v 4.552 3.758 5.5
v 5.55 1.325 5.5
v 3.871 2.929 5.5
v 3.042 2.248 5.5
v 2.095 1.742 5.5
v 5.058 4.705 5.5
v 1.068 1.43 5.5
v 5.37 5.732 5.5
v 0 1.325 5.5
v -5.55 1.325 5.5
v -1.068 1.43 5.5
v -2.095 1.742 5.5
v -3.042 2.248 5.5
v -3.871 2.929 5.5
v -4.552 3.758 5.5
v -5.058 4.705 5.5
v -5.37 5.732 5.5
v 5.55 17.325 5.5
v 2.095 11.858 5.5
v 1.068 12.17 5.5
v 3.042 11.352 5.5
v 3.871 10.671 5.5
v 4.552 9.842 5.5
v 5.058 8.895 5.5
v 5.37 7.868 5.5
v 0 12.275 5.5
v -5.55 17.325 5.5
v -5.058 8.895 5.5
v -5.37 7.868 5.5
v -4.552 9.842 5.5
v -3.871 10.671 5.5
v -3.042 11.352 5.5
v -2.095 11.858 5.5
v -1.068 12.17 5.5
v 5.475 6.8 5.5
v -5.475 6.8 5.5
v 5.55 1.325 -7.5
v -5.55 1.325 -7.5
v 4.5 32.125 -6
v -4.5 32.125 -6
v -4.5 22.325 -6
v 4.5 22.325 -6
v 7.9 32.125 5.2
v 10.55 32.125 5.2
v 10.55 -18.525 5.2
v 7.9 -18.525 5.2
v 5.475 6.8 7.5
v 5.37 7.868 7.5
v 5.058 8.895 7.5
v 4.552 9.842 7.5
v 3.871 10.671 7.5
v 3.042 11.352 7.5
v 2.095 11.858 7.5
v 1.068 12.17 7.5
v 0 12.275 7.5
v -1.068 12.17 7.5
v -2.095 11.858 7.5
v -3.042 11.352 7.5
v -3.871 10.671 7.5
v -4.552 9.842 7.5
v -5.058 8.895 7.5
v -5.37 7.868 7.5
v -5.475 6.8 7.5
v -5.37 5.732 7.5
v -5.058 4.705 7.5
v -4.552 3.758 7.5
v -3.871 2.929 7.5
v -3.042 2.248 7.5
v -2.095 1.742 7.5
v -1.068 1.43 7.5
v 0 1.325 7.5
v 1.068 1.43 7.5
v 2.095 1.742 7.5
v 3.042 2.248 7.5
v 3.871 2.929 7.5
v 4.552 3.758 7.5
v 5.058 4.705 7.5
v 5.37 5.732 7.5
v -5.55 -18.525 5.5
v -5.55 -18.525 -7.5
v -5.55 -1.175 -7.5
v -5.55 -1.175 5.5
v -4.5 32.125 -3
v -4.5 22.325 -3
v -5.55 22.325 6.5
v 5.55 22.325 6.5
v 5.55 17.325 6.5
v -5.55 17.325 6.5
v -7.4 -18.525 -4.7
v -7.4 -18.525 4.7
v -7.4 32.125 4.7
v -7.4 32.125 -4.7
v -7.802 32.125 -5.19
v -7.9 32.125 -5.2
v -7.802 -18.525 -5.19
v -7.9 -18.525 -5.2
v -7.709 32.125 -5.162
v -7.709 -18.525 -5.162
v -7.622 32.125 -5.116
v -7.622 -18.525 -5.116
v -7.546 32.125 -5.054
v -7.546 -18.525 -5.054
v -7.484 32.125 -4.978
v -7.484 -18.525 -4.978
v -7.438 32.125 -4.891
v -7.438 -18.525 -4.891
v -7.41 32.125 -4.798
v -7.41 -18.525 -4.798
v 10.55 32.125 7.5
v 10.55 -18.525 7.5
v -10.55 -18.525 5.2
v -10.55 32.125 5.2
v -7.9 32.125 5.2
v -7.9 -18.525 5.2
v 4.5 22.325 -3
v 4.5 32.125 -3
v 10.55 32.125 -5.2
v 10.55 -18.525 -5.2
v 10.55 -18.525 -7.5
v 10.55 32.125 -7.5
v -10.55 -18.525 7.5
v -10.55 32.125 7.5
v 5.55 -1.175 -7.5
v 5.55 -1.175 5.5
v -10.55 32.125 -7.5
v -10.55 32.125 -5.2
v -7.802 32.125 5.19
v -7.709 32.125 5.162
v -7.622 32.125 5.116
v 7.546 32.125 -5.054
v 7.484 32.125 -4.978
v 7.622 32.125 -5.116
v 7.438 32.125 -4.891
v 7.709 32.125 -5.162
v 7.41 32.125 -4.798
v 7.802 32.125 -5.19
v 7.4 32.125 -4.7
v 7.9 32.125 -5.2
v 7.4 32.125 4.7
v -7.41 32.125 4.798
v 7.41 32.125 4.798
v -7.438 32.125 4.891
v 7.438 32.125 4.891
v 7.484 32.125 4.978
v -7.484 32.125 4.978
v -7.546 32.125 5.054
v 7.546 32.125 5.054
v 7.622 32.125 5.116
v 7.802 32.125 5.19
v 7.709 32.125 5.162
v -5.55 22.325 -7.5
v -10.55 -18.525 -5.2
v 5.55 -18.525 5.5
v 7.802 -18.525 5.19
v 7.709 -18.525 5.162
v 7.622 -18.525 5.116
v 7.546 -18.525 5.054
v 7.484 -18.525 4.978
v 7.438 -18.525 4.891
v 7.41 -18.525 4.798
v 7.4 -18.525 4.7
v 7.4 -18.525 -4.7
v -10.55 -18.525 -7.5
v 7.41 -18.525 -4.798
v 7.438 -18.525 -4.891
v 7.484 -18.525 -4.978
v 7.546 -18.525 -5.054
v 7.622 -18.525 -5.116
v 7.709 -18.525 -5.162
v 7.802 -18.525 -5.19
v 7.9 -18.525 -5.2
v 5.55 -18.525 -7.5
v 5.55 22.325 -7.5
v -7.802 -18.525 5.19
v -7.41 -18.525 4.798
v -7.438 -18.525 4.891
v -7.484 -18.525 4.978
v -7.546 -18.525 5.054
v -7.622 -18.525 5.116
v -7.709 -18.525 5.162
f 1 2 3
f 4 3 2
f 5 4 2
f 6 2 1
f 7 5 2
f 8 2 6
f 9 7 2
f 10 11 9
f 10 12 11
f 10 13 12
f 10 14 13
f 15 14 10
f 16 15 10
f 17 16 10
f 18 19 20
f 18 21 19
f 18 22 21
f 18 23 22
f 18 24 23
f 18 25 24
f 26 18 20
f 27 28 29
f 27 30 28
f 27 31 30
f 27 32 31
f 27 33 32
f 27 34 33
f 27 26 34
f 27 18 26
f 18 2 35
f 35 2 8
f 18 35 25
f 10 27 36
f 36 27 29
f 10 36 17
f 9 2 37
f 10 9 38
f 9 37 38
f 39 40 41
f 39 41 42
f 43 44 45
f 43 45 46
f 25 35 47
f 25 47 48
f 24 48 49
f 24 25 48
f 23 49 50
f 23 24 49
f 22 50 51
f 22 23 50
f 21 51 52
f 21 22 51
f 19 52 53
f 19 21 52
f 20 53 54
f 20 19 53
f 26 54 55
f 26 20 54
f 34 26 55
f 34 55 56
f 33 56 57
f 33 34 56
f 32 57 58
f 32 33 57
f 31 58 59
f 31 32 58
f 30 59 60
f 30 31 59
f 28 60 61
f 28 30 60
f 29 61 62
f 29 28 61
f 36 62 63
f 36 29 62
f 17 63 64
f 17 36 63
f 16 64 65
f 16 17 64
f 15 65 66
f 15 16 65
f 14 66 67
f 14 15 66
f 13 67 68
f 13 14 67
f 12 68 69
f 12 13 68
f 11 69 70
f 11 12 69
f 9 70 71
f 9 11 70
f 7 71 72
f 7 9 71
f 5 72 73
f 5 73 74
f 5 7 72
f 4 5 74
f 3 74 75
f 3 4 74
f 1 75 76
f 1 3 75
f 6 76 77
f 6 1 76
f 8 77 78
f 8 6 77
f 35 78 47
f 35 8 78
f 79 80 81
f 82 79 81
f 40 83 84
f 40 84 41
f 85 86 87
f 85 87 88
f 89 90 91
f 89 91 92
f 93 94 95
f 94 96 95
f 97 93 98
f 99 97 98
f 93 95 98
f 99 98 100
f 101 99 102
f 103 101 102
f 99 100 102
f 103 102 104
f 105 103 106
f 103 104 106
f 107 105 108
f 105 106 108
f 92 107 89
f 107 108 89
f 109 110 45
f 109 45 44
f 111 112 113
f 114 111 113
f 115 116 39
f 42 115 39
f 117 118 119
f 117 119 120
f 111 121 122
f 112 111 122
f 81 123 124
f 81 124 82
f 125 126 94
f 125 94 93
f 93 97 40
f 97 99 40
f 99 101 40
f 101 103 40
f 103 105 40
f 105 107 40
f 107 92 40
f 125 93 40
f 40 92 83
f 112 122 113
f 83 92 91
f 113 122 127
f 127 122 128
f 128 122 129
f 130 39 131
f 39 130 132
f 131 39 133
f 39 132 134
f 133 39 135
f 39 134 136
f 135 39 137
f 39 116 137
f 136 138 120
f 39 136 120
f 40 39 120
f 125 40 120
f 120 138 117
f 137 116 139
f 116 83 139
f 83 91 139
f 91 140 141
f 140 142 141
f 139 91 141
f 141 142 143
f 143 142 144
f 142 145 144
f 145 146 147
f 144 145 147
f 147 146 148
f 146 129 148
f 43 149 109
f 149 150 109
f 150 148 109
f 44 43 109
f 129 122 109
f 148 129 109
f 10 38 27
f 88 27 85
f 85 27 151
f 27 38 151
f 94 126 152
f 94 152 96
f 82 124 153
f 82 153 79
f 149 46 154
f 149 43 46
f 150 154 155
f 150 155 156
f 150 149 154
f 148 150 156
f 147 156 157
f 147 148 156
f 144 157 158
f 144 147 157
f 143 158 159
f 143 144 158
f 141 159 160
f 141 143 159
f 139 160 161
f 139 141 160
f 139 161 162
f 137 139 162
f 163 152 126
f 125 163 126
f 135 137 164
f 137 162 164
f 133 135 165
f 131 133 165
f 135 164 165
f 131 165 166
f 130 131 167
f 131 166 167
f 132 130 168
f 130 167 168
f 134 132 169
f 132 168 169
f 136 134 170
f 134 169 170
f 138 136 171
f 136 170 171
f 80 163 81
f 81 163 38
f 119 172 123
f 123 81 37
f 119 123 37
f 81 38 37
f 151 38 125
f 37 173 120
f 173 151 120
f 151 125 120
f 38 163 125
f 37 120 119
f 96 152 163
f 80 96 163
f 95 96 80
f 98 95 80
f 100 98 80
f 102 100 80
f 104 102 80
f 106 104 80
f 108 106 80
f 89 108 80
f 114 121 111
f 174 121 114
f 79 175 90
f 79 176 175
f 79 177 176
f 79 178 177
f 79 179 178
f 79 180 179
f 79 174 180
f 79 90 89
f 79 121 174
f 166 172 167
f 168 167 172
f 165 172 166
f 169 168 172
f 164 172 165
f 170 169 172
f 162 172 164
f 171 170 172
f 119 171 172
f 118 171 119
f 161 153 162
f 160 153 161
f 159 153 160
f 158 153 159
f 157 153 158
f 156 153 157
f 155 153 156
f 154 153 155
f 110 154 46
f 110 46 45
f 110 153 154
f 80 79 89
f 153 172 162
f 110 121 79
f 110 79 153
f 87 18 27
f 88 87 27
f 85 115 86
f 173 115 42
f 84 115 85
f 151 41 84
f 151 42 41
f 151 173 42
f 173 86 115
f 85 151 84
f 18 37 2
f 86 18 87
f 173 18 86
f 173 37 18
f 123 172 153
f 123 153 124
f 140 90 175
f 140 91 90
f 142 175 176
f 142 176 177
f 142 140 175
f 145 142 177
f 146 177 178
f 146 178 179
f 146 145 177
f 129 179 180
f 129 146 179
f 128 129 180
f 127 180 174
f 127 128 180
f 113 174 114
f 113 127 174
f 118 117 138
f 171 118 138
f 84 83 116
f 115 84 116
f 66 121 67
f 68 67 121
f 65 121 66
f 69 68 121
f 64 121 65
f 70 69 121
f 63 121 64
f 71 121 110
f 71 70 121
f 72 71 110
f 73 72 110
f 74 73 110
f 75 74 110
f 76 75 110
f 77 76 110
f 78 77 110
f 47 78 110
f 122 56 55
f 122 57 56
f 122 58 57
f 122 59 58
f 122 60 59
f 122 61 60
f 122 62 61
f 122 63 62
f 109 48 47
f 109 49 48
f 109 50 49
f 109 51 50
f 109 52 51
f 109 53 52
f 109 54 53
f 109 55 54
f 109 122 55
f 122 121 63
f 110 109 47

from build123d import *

# Parameters (mm, degrees)
SKETCH2_W           = 21.1
SKETCH2_H           = 50.65
SKETCH2_R           = 5.475
BOSS_EXTRUDE1_DEPTH = 7.5
SKETCH3_W           = 3.15
SKETCH3_H           = 10.4
CUT_EXTRUDE1_DEPTH  = 53.277863384
FILLET1_R           = 0.5
SKETCH4_W           = 11.1
SKETCH4_H           = 21
CUT_EXTRUDE3_DEPTH  = 13
SKETCH6_W           = 11.1
SKETCH6_H           = 18.940672382
CUT_EXTRUDE4_DEPTH  = 13
SKETCH7_W           = 11.1
SKETCH7_H           = 5
CUT_EXTRUDE5_DEPTH  = 1
SKETCH8_W           = 9
SKETCH8_H           = 3
CUT_EXTRUDE6_DEPTH  = 9.8


with BuildPart() as part:
    # Sketch2 → Boss-Extrude1 (new, symmetric)
    with BuildSketch(Plane.XY):
        with Locations((0, 6.8)):
            Rectangle(SKETCH2_W, SKETCH2_H)
        with Locations((0, 6.8)):
            Circle(SKETCH2_R, mode=Mode.SUBTRACT)
    extrude(amount=BOSS_EXTRUDE1_DEPTH, both=True)

    # Sketch3 → Cut-Extrude1 (cut, symmetric)
    with BuildSketch(Plane(origin=(0, 32.125, 0), x_dir=(1, 0, 0), z_dir=(0, 1, 0))):
        with Locations((-8.975, 0)):
            Rectangle(SKETCH3_W, SKETCH3_H)
    cut_extrude1 = extrude(amount=CUT_EXTRUDE1_DEPTH, both=True, mode=Mode.SUBTRACT)

    # Mirror1: Cut-Extrude1 across plane
    add(cut_extrude1.mirror(Plane(origin=(0, 0, 0), x_dir=(0, 0, 1), z_dir=(1, 0, 0))), mode=Mode.SUBTRACT)

    # Fillet1
    fillet1_edges = [part.edges().sort_by_distance(p)[0] for p in [
        (-7.4, 6.8, -5.2),
        (-7.4, 6.8, 5.2),
        (7.4, 6.8, 5.2),
        (7.4, 6.8, -5.2),
    ]]
    fillet(fillet1_edges, radius=FILLET1_R)

    # Sketch4 → Cut-Extrude3 (cut)
    with BuildSketch(Plane(origin=(0, 0, -7.5), x_dir=(-1, 0, 0), z_dir=(0, 0, -1))):
        with Locations((0, 11.825)):
            Rectangle(SKETCH4_W, SKETCH4_H)
    extrude(amount=-CUT_EXTRUDE3_DEPTH, mode=Mode.SUBTRACT)

    # Sketch6 → Cut-Extrude4 (cut)
    with BuildSketch(Plane(origin=(0, 0, -7.5), x_dir=(-1, 0, 0), z_dir=(0, 0, -1))):
        with Locations((0, -10.645336191)):
            Rectangle(SKETCH6_W, SKETCH6_H)
    extrude(amount=-CUT_EXTRUDE4_DEPTH, mode=Mode.SUBTRACT)

    # Sketch7 → Cut-Extrude5 (cut)
    with BuildSketch(Plane(origin=(0, 0, 5.5), x_dir=(-1, 0, 0), z_dir=(0, 0, -1))):
        with Locations((0, 19.825)):
            Rectangle(SKETCH7_W, SKETCH7_H)
    extrude(amount=-CUT_EXTRUDE5_DEPTH, mode=Mode.SUBTRACT)

    # Sketch8 → Cut-Extrude6 (cut)
    with BuildSketch(Plane(origin=(0, 32.125, 0), x_dir=(1, 0, 0), z_dir=(0, 1, 0))):
        with Locations((0, 4.5)):
            Rectangle(SKETCH8_W, SKETCH8_H)
    extrude(amount=-CUT_EXTRUDE6_DEPTH, mode=Mode.SUBTRACT)


solid = part.part
